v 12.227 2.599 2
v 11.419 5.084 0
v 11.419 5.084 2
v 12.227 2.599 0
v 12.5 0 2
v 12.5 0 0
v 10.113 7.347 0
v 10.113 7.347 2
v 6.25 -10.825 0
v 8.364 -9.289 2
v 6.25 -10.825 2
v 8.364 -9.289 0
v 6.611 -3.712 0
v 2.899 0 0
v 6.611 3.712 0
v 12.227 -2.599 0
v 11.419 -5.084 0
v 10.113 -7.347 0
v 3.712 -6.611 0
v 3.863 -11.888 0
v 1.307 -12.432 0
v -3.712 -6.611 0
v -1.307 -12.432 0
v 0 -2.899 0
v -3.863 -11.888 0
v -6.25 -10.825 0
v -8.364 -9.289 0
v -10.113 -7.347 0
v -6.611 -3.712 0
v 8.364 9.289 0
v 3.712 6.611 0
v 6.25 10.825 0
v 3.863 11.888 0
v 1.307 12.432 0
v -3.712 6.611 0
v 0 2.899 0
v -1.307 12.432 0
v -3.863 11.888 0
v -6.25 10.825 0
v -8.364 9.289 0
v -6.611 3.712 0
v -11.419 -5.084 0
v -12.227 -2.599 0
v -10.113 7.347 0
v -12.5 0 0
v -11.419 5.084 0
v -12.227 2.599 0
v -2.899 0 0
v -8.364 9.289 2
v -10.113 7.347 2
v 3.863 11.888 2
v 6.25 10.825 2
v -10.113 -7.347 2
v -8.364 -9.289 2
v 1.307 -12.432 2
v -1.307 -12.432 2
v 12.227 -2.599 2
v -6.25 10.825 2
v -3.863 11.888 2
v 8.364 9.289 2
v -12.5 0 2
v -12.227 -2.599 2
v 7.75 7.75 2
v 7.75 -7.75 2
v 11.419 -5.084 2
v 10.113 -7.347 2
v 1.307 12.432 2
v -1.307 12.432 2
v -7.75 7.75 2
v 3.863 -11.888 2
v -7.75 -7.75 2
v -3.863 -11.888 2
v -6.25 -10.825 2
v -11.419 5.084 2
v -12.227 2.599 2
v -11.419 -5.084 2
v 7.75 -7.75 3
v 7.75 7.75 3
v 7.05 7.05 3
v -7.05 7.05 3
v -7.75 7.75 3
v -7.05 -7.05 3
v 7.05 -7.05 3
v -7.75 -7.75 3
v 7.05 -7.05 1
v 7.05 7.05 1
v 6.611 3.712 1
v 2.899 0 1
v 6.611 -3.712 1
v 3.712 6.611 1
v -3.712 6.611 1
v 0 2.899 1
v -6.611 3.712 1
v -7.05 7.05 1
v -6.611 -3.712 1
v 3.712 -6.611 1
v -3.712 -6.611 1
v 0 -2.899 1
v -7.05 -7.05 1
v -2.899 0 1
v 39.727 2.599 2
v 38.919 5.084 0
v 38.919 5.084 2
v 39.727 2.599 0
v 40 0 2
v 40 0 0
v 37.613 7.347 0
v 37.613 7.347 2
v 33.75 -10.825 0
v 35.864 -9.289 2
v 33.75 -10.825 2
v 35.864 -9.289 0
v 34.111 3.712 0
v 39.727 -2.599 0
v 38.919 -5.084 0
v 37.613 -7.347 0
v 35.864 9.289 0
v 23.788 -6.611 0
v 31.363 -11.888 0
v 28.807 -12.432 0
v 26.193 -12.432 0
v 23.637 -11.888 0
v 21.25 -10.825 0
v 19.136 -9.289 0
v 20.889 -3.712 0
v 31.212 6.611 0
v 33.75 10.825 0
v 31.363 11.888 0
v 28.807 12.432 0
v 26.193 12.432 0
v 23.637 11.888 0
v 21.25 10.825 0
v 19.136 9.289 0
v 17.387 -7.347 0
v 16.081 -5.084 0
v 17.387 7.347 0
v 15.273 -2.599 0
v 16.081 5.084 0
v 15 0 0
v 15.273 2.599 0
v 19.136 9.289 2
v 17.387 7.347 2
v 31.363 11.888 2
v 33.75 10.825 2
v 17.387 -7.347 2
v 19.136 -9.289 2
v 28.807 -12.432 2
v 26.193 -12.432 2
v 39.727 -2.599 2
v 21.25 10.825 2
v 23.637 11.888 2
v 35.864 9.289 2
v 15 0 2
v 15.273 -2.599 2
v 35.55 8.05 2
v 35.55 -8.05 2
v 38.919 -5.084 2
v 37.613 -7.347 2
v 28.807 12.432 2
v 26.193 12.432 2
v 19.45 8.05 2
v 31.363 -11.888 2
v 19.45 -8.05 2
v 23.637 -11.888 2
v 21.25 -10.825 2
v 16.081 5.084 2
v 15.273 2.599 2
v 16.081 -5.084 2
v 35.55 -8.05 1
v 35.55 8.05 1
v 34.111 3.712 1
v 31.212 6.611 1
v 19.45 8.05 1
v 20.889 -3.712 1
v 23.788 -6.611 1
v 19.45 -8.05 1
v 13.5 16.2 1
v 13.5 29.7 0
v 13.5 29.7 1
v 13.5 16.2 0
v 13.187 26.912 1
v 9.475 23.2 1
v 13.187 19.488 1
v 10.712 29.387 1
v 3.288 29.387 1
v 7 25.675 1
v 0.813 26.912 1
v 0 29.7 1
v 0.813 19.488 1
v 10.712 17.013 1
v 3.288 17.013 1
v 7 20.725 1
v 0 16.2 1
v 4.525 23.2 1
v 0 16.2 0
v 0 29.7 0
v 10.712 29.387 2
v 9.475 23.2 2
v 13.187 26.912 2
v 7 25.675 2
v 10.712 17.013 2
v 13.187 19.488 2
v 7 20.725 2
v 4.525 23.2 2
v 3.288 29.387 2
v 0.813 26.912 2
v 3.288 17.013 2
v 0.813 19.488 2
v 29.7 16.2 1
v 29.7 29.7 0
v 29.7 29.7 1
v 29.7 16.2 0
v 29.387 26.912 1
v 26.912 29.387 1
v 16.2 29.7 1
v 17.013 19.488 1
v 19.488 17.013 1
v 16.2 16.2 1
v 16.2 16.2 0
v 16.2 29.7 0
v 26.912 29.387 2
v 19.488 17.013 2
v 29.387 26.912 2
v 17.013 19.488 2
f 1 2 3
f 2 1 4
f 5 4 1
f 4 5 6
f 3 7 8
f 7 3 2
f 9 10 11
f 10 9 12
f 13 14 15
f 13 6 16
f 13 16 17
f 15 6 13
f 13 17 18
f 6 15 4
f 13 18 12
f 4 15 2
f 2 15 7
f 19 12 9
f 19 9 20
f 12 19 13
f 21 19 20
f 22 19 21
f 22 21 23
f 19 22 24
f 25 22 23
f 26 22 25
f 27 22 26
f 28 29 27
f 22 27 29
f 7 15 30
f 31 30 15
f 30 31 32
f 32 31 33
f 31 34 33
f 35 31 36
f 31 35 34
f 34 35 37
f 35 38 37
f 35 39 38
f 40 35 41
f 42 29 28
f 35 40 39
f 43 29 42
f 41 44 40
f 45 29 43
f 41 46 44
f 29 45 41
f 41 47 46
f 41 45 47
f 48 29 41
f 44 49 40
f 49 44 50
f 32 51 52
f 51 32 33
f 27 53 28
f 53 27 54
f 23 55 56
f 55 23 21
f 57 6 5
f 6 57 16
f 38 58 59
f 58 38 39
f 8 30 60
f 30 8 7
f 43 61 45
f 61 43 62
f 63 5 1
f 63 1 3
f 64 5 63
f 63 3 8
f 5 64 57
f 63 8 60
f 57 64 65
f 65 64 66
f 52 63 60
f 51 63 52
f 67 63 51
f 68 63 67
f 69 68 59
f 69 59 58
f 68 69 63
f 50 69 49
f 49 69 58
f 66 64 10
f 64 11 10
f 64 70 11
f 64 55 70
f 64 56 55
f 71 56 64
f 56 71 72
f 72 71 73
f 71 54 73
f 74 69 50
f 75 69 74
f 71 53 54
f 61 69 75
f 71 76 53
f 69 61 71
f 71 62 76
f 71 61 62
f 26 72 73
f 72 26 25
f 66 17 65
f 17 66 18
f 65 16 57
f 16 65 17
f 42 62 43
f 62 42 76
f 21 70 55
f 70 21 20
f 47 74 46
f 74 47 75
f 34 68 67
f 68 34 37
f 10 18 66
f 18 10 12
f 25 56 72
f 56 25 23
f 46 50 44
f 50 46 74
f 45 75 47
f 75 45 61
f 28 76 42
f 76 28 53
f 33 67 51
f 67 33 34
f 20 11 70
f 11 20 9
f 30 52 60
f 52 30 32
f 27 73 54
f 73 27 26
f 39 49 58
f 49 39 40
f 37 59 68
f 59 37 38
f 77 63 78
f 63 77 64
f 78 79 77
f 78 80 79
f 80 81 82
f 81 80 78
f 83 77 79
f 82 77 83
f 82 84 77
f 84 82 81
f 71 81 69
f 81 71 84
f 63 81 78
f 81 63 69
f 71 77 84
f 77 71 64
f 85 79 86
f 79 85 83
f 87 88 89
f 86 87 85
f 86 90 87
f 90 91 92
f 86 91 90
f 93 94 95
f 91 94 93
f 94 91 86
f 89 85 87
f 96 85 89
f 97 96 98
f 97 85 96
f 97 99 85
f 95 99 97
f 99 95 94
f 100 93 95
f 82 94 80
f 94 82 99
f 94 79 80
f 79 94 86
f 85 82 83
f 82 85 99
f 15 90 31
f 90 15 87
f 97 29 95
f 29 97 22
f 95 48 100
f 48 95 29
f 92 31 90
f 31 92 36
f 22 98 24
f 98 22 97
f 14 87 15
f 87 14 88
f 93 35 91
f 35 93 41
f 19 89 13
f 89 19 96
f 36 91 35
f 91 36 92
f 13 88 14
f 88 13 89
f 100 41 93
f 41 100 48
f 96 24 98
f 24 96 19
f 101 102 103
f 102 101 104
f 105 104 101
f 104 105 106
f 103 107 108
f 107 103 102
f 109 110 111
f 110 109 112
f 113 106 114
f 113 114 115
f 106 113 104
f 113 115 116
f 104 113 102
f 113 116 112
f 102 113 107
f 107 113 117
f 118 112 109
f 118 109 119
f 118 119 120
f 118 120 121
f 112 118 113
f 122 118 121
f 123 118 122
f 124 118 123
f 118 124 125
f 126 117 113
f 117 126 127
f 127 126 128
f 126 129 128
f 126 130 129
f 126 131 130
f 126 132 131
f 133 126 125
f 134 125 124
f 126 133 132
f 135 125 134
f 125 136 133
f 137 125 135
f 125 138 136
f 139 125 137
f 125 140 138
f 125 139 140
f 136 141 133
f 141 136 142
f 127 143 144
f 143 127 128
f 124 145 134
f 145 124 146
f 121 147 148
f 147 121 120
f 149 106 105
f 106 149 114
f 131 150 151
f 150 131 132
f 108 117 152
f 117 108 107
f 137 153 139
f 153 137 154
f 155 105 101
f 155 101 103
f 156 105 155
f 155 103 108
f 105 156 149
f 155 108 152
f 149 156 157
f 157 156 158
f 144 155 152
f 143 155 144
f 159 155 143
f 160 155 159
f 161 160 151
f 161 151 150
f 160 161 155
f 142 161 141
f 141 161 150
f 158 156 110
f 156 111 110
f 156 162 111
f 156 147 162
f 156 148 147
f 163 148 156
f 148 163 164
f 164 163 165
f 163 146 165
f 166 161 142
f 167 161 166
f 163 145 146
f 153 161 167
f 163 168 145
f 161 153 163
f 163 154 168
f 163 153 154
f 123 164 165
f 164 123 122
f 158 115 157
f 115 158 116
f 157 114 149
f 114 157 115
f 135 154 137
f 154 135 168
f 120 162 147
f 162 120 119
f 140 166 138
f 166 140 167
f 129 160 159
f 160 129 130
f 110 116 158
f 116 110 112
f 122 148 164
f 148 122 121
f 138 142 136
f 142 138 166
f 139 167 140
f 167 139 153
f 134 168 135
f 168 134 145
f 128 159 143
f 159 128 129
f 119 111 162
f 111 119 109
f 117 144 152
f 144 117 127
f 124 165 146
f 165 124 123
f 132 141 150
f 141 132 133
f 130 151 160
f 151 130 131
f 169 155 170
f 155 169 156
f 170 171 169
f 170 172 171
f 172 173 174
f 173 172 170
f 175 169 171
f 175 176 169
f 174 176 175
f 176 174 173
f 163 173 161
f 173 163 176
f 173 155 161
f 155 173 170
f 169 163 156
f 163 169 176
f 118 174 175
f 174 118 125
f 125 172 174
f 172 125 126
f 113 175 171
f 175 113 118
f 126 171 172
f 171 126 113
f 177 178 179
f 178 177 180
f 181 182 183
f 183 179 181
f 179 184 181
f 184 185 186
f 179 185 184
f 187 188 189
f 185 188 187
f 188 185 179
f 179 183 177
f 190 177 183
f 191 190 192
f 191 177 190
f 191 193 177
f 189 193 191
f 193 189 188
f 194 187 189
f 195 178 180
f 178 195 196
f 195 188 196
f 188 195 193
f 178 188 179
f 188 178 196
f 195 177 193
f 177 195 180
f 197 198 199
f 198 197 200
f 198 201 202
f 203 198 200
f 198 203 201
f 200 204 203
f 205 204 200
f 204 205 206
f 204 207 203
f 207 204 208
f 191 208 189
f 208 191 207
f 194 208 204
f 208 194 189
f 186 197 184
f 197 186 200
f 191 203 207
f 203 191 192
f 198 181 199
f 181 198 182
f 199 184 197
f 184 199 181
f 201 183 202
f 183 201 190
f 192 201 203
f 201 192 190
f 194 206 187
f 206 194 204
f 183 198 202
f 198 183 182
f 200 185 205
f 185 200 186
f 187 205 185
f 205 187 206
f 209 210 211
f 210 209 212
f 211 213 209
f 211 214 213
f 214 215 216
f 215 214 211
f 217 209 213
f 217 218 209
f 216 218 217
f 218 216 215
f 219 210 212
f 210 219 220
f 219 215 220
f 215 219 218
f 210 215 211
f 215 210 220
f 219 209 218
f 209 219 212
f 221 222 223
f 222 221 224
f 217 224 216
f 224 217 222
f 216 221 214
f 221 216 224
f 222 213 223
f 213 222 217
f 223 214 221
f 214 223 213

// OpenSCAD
// gap between edge and cut based on printer and material
tolerance = 0.3;

// small number to prevent singularities
fudge = 0.01;

// outer diameter of token
diameter = 25;

// height of token
height = 4;

// part to generate
part = "all"; //["all", "light", "dark", "outer", "inner", "outer_plus", "inner_plus", "outer_minus", "inner_minus"]

outerSquare = diameter * 15.5/25;
outerCut = outerSquare + 2 * tolerance;
innerSquare = diameter * 13.5/25;
innerCut = innerSquare + 2 * tolerance;
symbolLength = diameter * 14/25;
symbolLengthCut = symbolLength + 2 * tolerance;
symbolWidth = diameter * 3.5/25;
symbolWidthCut = symbolWidth + 2 * tolerance;

if (part == "all" || part == "outer" || part == "light" || part == "outer_plus") outerPlus();
if (part == "all" || part == "outer" || part == "dark" || part == "outer_minus") outerMinus();
if (part == "all" || part == "inner" || part == "dark" || part == "inner_plus") innerPlus();
if (part == "all" || part == "inner" || part == "light" || part == "inner_minus") innerMinus();

module outerPlus() {
    difference() {
        union() {
            cylinder(r = diameter / 2, h = 2);
            translate([-outerSquare / 2, -outerSquare / 2, 0]) cube([outerSquare, outerSquare, 3/4 * height]);
        }
        translate([-innerCut / 2, -innerCut / 2, 1/4 * height]) cube([innerCut, innerCut, 2.01]);
        translate([0, 0, 1/4 * height - fudge]) rotate([0, 0, 45]) cube([symbolLengthCut, symbolWidthCut, 2/4 * height + 2 * fudge], center = true);
        translate([0, 0, 1/4 * height - fudge]) rotate([0, 0, 135]) cube([symbolLengthCut, symbolWidthCut, 2/4 * height + 2 * fudge], center = true);
    }
}

module outerMinus() {
    translate([diameter * 1.1, 0, 0]) difference() {
        cylinder(r = diameter / 2, h = 2);
        translate([-outerCut / 2, -outerCut / 2, 1]) cube([outerCut, outerCut, 2]);
        translate([0, 0, 1/4 * height - fudge]) rotate([0, 0, 45]) cube([symbolLengthCut, symbolWidthCut, 2/4 * height + 2 * fudge], center = true);
    }
}

module innerPlus() {  
    translate([0, innerSquare * 1.2, 0]) union() {
        cube([innerSquare, innerSquare, 1]);
        translate([symbolLength / 2, symbolLength / 2, 1/4 * height]) rotate([0, 0, 45]) cube([symbolLength, symbolWidth, 2/4 * height], center = true);
        translate([symbolLength / 2, symbolLength / 2, 1/4 * height]) rotate([0, 0, 135]) cube([symbolLength, symbolWidth, 2/4 * height], center = true);
    }
}

module innerMinus() {
    translate([innerSquare * 1.2, innerSquare * 1.2, 0]) union() {
        cube([innerSquare, innerSquare, 1/4 * height]);
        translate([symbolLength / 2, symbolLength / 2, 1/4 * height]) rotate([0, 0, 45]) cube([symbolLength, symbolWidth, 2/4 * height], center = true);
    }
}
